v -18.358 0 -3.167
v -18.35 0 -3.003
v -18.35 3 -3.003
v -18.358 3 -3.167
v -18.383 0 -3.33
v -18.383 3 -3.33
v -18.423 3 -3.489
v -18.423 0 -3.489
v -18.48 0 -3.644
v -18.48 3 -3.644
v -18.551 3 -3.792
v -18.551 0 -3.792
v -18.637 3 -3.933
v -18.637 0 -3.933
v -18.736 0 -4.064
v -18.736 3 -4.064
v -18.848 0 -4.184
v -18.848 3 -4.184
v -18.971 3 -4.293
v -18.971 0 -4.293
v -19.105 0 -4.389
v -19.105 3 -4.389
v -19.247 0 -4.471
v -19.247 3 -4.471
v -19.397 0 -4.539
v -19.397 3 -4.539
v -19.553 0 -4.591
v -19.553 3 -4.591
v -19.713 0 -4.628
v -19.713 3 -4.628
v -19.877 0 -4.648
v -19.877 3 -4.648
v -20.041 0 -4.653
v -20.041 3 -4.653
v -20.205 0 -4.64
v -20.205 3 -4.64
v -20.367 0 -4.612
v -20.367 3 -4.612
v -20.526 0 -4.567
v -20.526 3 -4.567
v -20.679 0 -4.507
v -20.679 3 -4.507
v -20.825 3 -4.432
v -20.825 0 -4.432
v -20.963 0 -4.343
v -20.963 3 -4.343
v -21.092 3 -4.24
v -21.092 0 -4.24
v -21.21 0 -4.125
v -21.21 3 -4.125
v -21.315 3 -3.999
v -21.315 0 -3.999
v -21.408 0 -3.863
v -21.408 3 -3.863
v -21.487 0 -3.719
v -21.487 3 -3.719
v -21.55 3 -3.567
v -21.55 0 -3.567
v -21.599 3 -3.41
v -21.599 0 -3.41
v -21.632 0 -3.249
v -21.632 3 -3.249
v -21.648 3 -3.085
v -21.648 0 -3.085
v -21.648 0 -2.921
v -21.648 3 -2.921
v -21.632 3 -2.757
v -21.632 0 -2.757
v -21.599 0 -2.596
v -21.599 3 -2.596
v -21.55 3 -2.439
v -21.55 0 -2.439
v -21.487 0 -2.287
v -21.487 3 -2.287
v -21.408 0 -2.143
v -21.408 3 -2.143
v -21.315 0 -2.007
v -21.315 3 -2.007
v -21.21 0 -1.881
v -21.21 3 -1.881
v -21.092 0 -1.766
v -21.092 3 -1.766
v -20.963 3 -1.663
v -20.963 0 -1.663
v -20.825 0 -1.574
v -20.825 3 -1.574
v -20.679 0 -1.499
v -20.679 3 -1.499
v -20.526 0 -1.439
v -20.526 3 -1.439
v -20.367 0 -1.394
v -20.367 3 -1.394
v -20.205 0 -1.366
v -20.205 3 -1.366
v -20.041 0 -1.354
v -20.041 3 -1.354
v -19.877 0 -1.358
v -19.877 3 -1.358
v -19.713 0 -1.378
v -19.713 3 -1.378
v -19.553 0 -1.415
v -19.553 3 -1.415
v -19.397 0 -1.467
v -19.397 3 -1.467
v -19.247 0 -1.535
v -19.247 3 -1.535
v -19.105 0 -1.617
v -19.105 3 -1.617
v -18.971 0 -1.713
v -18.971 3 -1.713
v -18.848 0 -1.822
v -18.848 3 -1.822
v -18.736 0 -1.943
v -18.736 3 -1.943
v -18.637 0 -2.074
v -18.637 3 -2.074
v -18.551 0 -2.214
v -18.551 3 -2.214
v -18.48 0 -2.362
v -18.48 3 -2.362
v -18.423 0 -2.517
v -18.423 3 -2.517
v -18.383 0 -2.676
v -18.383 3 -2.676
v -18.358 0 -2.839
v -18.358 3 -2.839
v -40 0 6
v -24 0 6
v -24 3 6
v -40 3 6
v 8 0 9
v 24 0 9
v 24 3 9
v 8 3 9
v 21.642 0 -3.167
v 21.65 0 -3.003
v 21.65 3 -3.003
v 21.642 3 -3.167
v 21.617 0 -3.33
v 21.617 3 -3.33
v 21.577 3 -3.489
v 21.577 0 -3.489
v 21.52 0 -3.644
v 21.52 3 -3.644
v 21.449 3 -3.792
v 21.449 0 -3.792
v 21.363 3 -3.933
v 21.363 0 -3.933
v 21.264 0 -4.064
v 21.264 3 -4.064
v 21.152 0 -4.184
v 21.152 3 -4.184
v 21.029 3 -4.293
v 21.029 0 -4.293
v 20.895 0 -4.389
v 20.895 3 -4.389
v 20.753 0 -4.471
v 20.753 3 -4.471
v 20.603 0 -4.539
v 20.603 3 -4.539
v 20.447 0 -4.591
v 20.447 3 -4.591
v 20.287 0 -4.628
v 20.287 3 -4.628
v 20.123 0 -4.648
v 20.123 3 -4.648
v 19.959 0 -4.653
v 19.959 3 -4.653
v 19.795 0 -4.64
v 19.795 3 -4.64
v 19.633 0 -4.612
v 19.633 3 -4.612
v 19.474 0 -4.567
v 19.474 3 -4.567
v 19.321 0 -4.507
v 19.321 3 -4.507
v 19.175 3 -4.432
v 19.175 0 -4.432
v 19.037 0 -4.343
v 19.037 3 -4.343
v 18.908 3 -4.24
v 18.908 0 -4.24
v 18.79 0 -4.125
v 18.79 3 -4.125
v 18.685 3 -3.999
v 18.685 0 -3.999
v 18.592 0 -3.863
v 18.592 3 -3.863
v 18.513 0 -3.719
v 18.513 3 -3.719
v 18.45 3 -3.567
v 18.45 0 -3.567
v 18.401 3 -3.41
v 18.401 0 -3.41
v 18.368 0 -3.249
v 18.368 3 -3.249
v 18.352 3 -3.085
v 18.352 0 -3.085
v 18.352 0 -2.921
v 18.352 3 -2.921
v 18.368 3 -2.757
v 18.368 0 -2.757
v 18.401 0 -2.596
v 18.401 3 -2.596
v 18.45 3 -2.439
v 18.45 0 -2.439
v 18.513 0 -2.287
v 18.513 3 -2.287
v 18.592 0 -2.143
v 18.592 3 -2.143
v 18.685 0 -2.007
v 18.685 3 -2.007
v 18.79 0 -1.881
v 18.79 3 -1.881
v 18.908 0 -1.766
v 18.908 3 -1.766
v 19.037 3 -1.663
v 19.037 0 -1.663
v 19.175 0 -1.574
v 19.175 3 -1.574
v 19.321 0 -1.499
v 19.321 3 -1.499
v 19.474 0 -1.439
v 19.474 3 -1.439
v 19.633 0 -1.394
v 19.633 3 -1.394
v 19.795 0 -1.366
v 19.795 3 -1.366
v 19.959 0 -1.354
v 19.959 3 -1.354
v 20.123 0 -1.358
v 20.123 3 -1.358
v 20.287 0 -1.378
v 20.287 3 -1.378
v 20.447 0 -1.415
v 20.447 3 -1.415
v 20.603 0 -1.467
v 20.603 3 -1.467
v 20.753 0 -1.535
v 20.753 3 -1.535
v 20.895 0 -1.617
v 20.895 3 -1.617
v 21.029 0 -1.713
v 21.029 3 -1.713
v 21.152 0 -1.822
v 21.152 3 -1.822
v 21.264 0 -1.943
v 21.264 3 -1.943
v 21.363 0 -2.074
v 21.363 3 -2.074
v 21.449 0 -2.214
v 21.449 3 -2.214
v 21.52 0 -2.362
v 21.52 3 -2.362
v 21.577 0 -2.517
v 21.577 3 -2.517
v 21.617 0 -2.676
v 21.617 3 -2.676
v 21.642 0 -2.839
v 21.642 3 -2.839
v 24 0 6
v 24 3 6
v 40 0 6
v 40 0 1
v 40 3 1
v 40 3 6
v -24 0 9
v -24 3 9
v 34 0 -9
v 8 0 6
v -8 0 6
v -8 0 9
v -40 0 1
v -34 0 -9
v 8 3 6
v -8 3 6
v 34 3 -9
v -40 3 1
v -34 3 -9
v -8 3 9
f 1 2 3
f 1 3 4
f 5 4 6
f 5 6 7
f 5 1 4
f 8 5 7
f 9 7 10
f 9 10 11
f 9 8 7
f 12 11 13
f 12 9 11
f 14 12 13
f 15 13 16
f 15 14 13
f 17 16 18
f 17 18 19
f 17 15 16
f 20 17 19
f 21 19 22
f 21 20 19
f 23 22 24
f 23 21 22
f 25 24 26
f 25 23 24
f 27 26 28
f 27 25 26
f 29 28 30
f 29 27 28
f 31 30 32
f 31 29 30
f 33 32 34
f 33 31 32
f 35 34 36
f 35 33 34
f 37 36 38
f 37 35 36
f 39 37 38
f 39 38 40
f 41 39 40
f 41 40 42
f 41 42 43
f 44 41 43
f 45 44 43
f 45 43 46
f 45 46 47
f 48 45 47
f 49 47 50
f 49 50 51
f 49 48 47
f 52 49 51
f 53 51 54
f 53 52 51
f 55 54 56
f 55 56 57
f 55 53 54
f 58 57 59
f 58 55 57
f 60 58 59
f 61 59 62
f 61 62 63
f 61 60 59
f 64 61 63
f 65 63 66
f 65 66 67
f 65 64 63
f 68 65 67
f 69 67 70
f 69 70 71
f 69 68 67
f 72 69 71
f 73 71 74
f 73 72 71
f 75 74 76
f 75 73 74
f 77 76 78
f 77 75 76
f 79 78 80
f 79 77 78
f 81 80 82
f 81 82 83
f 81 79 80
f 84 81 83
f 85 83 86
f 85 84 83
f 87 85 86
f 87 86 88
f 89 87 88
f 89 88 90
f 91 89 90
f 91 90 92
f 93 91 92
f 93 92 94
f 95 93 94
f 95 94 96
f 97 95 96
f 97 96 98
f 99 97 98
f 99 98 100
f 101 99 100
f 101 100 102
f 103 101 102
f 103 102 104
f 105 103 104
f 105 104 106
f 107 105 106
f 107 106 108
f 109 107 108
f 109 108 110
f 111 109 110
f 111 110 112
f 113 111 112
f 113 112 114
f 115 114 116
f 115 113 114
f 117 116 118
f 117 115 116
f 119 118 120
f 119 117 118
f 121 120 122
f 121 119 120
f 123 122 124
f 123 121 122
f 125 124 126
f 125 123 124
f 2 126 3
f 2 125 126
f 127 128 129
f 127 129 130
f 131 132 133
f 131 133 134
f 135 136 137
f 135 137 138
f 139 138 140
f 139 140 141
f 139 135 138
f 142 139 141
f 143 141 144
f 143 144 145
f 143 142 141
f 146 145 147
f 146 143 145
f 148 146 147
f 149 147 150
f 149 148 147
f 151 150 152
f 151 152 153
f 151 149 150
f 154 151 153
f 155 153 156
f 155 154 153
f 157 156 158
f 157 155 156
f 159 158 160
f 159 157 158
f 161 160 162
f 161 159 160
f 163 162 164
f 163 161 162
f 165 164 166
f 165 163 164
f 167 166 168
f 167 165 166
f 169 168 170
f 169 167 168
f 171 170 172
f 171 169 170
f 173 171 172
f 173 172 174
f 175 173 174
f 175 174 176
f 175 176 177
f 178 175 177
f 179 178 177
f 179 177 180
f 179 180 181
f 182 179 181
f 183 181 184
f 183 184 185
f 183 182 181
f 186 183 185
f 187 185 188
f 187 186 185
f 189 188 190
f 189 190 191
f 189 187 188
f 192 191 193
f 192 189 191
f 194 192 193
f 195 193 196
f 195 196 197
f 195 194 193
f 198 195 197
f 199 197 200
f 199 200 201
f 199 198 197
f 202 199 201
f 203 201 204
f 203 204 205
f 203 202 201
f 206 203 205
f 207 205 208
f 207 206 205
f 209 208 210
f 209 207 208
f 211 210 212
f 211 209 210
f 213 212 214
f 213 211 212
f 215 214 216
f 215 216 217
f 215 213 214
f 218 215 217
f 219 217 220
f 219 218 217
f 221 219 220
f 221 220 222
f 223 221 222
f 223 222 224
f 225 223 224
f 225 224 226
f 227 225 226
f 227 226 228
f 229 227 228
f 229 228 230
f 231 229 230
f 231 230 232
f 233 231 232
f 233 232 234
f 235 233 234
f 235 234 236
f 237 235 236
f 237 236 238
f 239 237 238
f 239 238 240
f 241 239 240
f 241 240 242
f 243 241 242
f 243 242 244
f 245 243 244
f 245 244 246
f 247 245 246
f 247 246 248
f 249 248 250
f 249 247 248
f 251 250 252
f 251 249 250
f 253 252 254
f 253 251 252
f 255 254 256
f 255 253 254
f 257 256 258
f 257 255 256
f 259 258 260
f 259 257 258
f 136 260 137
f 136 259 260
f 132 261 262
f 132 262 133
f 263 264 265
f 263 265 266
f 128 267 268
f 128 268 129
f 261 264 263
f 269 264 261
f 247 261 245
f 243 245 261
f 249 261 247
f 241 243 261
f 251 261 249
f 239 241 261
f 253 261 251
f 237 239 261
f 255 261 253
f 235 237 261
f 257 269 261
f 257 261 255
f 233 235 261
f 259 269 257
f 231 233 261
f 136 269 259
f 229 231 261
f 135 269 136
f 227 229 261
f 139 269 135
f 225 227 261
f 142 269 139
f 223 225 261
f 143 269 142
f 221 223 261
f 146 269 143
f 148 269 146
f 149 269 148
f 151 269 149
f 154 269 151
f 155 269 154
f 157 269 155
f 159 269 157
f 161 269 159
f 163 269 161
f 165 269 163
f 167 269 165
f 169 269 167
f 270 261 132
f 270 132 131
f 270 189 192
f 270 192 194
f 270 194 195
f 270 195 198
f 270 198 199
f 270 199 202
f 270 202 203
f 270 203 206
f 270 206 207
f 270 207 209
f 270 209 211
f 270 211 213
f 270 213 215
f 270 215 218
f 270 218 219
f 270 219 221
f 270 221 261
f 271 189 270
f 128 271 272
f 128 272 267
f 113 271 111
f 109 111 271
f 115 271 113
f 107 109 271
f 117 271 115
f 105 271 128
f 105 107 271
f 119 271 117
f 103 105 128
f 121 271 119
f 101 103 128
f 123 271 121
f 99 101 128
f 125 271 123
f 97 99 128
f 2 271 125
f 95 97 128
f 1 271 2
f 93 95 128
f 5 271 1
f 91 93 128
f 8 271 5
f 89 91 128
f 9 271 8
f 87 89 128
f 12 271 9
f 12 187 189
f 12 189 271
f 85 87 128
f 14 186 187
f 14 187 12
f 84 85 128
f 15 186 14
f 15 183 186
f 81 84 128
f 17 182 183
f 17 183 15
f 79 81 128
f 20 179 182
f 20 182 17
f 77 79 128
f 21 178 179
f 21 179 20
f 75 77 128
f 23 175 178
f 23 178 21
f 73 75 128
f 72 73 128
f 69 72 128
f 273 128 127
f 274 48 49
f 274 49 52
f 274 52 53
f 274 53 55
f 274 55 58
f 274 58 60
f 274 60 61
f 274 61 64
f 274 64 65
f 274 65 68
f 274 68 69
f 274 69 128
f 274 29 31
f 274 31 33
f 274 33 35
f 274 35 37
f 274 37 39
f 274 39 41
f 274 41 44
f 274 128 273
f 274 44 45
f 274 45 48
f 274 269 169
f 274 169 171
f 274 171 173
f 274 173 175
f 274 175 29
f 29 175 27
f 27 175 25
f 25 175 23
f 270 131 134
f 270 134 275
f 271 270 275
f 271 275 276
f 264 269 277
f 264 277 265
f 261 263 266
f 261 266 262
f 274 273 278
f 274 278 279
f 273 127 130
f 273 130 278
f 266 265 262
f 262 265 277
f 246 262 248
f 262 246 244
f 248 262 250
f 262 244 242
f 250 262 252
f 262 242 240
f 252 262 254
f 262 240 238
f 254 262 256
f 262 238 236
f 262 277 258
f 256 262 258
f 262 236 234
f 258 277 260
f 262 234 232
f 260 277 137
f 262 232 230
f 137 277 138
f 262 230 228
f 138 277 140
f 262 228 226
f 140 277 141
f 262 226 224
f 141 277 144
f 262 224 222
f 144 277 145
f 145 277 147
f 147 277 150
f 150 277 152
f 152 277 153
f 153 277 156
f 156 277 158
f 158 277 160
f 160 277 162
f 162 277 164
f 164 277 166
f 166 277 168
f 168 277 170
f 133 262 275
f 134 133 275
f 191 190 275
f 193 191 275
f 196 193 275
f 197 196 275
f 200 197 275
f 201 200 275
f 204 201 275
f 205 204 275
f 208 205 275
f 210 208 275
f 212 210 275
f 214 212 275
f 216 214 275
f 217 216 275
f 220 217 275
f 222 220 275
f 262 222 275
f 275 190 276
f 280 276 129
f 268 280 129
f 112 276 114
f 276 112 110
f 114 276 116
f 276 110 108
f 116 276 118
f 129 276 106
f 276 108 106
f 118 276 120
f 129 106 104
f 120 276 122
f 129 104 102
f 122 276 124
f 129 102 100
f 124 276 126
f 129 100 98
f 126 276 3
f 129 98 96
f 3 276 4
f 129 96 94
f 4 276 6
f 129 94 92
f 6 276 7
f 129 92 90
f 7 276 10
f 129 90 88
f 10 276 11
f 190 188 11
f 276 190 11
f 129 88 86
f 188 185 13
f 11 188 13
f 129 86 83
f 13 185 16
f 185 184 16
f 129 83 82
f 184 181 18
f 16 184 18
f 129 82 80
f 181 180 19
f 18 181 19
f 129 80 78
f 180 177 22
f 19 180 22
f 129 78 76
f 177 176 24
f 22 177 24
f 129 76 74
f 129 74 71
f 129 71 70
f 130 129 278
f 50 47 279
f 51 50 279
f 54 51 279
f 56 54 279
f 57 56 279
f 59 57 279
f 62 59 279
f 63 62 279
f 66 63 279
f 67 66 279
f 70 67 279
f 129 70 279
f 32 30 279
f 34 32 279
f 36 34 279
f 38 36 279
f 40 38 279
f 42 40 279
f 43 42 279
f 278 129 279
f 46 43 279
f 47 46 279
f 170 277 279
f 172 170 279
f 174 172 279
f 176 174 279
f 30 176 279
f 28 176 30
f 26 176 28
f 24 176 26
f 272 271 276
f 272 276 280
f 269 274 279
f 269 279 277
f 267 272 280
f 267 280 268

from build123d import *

# Parameters (mm, degrees)
SKETCH1_R           = 1.65
BOSS_EXTRUDE1_DEPTH = 3


with BuildPart() as part:
    # Sketch1 → Boss-Extrude1 (new body)
    with BuildSketch(Plane(origin=(0, 0, 0), x_dir=(1, 0, 0), z_dir=(0, 1, 0))):
        Polygon((-40, -1), (-34, 9), (34, 9), (40, -1), (40, -6), (24, -6), (24, -9), (8, -9), (8, -6), (-8, -6), (-8, -9), (-24, -9), (-24, -6), (-40, -6), align=None)
        with Locations((-20, 3.003103662)):
            Circle(SKETCH1_R, mode=Mode.SUBTRACT)
        with Locations((20, 3.003103662)):
            Circle(SKETCH1_R, mode=Mode.SUBTRACT)
    extrude(amount=BOSS_EXTRUDE1_DEPTH)


solid = part.part
